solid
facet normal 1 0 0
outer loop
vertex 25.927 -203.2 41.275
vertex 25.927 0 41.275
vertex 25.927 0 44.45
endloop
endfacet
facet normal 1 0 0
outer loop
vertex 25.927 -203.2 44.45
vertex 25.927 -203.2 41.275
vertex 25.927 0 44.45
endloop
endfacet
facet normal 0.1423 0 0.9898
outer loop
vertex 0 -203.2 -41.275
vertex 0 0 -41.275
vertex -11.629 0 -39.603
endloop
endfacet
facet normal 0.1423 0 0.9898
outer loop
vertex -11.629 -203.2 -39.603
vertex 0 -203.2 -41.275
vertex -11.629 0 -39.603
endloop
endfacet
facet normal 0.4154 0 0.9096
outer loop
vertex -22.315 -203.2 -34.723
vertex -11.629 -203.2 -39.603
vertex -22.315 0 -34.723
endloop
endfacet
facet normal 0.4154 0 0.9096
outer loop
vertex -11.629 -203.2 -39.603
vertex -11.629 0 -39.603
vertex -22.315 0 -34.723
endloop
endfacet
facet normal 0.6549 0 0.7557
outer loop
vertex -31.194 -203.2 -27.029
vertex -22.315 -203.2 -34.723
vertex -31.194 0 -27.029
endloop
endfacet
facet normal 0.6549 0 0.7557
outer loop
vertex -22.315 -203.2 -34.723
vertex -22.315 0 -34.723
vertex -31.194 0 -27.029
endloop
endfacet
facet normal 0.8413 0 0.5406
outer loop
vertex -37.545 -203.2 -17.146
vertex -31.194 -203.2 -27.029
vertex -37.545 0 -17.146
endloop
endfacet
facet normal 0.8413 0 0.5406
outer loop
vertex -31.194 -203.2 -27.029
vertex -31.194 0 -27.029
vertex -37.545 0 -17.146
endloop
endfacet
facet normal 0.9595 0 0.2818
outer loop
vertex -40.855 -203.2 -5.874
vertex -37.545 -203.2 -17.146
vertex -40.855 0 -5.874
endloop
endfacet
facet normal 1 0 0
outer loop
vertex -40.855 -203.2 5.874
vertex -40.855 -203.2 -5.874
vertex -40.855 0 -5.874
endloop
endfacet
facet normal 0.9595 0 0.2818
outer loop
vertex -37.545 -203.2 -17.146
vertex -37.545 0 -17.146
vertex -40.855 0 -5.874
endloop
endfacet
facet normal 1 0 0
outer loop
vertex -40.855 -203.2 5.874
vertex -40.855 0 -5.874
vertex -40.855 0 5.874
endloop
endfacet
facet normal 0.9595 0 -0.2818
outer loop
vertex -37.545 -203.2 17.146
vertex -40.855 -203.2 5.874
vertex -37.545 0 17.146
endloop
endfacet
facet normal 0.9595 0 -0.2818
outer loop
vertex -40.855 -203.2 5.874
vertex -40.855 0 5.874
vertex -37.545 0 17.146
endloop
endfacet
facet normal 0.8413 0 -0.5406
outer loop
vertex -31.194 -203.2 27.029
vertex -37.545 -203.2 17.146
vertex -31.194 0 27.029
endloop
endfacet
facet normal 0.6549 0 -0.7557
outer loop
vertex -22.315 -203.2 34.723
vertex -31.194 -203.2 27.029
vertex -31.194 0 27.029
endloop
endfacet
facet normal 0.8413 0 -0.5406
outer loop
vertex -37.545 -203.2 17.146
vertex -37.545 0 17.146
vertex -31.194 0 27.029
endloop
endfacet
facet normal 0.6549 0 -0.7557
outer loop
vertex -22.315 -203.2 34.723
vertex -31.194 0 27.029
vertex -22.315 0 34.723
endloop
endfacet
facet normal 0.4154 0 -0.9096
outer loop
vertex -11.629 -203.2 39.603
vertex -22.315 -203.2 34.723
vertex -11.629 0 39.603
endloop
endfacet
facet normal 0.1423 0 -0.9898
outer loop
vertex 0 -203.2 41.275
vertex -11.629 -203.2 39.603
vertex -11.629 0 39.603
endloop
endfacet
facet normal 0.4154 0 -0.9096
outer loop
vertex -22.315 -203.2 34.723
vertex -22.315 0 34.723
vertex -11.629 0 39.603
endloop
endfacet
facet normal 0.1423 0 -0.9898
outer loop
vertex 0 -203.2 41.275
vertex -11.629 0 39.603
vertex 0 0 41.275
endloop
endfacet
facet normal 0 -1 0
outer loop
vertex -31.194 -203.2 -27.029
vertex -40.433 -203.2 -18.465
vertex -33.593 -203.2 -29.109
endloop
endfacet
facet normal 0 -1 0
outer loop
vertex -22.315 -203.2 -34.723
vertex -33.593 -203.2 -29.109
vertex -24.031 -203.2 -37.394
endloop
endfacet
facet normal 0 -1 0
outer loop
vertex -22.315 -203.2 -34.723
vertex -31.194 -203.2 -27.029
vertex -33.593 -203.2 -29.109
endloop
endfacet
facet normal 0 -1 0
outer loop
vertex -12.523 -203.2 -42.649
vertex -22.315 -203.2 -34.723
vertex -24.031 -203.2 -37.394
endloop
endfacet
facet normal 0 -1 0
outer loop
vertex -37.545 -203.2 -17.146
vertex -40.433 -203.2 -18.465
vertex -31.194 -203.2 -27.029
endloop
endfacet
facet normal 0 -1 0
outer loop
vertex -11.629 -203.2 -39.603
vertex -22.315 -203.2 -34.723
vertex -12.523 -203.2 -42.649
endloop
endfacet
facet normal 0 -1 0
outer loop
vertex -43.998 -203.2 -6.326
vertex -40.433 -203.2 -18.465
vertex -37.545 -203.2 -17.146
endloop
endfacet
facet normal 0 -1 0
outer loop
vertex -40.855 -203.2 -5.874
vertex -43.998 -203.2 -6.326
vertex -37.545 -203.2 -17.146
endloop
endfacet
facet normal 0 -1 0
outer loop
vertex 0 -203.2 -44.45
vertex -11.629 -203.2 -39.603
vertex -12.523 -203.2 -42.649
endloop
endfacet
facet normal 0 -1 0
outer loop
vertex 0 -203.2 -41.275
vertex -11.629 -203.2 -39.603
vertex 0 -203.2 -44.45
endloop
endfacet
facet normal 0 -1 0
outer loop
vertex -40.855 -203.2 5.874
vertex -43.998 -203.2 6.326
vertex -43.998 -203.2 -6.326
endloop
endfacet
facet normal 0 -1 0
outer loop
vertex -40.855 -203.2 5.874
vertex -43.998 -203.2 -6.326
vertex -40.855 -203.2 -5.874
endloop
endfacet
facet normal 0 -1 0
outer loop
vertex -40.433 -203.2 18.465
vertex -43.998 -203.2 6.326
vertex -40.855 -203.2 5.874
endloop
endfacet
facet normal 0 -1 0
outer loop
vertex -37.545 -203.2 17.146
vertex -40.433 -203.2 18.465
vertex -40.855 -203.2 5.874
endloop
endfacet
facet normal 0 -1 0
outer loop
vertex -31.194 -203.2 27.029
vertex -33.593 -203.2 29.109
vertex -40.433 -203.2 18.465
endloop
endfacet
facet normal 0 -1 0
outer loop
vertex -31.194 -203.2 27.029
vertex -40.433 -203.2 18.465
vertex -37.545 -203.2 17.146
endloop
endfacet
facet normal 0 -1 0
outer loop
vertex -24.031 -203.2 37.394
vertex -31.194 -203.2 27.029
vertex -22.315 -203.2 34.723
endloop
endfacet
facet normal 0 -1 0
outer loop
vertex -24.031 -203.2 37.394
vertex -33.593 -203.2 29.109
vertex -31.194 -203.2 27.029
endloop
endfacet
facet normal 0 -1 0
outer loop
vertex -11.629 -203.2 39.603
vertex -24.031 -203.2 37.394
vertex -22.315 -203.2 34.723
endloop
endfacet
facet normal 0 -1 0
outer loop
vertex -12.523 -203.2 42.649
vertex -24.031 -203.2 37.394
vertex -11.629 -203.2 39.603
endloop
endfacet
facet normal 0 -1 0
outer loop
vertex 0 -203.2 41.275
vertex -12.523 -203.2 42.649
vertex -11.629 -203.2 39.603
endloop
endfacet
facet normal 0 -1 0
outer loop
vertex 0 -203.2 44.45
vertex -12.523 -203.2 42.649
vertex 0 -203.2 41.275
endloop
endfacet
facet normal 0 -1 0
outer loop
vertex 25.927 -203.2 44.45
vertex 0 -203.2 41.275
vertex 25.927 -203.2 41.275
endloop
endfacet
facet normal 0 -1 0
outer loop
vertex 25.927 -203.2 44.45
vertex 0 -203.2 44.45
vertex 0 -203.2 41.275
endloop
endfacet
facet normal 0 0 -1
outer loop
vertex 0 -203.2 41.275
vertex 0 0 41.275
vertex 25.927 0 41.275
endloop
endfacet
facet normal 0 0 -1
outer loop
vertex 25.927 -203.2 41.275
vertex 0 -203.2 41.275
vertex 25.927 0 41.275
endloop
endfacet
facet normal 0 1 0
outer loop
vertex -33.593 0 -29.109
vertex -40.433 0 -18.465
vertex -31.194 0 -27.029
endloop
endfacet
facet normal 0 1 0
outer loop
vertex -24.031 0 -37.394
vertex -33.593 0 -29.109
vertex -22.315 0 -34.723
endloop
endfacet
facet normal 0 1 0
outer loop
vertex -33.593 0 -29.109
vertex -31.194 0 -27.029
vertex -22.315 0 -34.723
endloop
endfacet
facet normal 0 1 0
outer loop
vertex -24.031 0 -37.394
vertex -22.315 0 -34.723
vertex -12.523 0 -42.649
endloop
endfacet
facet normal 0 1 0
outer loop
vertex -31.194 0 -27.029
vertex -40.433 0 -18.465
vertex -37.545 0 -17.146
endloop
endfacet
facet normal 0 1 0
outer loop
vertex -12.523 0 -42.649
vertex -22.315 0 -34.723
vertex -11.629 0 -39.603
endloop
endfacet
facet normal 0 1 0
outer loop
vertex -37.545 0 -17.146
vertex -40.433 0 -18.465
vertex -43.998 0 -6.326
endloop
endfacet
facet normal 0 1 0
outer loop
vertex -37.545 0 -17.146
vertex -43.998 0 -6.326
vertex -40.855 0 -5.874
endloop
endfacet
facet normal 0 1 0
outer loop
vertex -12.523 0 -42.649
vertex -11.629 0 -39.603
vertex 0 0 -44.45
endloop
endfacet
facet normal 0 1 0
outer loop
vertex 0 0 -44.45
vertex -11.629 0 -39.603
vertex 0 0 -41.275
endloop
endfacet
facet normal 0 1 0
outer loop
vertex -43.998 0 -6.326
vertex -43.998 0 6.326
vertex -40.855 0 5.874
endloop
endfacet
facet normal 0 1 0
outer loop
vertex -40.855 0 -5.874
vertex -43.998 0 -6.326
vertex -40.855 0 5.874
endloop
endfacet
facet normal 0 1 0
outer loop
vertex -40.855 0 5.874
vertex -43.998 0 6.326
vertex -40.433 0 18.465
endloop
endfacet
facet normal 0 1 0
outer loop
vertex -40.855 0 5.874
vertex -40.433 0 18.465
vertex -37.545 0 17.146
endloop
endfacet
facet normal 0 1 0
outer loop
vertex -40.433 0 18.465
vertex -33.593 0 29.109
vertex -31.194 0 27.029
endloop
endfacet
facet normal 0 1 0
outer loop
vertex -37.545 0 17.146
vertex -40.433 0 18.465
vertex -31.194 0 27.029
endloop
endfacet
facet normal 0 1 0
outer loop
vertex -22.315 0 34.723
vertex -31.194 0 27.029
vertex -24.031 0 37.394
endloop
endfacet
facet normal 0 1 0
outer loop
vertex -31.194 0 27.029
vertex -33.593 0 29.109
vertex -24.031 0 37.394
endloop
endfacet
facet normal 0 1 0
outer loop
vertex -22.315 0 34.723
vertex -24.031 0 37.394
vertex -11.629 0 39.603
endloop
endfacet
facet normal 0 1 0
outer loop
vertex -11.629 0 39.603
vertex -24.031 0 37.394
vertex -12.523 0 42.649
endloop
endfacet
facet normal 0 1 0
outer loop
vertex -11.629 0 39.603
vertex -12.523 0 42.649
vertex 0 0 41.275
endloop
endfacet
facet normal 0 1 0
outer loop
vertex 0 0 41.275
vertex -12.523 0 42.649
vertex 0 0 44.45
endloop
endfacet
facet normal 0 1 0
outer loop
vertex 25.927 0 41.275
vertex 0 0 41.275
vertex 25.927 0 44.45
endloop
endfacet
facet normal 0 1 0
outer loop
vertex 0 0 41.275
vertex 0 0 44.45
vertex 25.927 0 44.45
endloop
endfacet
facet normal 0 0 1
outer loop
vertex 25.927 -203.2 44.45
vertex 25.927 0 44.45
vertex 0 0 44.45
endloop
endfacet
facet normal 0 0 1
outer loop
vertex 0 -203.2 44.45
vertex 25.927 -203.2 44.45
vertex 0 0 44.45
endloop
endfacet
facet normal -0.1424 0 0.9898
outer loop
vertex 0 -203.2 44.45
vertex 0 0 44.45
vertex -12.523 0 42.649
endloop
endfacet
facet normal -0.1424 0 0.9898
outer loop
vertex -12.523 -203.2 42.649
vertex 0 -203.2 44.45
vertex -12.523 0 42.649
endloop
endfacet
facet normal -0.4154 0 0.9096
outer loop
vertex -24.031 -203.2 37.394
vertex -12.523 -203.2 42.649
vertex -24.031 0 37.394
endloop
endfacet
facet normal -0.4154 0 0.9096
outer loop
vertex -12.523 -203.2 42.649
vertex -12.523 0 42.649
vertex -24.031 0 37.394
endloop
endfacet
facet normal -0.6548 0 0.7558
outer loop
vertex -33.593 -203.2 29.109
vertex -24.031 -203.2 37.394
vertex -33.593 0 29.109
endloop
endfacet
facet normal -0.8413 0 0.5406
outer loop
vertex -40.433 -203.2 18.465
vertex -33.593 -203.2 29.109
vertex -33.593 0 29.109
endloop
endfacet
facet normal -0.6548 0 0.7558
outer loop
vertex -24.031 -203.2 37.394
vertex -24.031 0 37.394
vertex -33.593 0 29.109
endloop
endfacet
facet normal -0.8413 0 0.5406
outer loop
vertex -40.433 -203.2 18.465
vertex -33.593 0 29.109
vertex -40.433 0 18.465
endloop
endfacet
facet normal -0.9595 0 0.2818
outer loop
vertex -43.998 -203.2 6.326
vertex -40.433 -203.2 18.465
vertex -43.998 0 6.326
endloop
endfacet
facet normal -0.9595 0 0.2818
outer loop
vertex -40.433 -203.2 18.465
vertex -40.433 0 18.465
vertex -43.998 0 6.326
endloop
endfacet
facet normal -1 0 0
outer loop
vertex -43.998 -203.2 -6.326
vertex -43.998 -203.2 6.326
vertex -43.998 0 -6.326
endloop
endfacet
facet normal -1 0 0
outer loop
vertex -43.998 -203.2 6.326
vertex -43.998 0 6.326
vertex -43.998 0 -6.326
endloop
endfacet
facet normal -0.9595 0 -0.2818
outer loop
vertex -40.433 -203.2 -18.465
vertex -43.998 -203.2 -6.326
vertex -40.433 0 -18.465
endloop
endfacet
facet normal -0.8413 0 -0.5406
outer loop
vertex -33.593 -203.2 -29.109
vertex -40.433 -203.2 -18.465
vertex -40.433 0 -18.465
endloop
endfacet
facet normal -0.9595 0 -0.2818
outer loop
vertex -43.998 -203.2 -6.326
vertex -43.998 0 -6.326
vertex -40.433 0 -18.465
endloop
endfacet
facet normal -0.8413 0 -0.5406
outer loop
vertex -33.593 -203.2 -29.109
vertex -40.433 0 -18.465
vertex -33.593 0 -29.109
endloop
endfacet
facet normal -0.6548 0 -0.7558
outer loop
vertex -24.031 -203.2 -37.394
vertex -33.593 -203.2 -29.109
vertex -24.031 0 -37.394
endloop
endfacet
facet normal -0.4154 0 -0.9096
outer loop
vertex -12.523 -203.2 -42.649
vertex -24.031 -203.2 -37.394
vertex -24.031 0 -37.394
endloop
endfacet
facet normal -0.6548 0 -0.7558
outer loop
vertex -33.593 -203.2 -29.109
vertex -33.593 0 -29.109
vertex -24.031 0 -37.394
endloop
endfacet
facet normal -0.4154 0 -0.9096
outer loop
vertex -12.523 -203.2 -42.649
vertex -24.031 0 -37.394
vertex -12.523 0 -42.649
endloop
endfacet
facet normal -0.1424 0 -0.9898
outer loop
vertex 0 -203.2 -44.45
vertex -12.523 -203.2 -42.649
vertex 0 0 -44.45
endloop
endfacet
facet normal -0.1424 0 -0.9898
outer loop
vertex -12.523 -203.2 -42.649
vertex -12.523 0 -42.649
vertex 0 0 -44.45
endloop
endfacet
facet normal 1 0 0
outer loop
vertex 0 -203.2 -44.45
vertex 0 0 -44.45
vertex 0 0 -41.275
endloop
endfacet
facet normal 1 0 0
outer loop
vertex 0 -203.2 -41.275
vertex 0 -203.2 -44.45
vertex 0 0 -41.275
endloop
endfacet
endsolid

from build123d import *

# Parameters (mm, degrees)
F1_DEPTH = 203.2


with BuildPart() as f1:
    # F0 (on Front) → F1 (new body)
    with BuildSketch(Plane.XZ):
        with BuildLine():
            ThreePointArc((0, -41.275), (-41.275, 0), (0, 41.275))
            Line((0, 41.275), (25.92662, 41.275))
            Line((25.92662, 41.275), (25.92662, 44.45))
            Line((25.92662, 44.45), (0, 44.45))
            ThreePointArc((0, 44.45), (-44.45, 0), (0, -44.45))
            Line((0, -44.45), (0, -41.275))
        make_face()
    extrude(amount=F1_DEPTH)


solid = f1.part
